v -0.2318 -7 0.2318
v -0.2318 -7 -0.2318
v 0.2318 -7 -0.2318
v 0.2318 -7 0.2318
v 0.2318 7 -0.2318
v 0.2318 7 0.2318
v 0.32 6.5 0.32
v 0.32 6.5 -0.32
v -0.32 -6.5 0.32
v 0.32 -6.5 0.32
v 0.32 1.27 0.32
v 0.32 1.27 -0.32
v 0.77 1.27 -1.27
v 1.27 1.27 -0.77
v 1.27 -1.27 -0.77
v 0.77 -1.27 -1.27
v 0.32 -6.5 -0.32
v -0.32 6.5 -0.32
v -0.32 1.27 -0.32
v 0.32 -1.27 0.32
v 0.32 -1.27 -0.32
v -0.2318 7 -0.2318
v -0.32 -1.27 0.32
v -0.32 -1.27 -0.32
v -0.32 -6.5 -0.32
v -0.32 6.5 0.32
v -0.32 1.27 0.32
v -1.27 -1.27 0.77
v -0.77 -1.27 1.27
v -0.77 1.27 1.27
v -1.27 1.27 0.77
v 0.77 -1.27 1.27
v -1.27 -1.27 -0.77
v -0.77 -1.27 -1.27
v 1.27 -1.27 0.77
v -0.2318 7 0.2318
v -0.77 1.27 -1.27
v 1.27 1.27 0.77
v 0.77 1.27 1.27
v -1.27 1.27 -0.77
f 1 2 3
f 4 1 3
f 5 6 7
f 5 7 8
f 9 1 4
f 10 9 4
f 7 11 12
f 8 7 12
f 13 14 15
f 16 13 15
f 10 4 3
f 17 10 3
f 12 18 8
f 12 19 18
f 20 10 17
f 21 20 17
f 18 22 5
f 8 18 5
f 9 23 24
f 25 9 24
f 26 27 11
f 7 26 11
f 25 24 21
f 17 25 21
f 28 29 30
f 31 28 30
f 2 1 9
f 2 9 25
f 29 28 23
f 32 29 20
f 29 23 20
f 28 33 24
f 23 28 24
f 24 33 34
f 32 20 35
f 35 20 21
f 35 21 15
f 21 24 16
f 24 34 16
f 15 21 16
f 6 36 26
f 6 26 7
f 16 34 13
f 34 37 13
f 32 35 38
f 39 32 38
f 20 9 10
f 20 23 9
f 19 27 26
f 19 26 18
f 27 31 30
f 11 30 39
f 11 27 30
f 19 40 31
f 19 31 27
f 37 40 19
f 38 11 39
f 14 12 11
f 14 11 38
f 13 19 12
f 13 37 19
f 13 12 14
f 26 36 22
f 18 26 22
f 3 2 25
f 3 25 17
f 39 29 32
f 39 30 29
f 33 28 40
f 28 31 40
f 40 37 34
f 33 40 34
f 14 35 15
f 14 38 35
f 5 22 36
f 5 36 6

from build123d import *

# Parameters (mm, degrees)
SKETCH1_W                = 2.54
SKETCH1_H                = 2.54
BOSS_EXTRUDE1_DEPTH      = 1.27
BOSS_EXTRUDE1_DEPTH_BACK = 1.27
SKETCH2_W                = 0.64
SKETCH2_H                = 0.64
BOSS_EXTRUDE2_DEPTH      = 7
BOSS_EXTRUDE2_DEPTH_BACK = 7
CHAMFER1_SIZE            = 0.5
CHAMFER1_SIZE2           = 0.08816349
CHAMFER1_PART_2_SIZE     = 0.5
CHAMFER1_PART_2_SIZE2    = 0.08816349
CHAMFER1_PART_3_SIZE     = 0.5
CHAMFER1_PART_3_SIZE2    = 0.08816349
CHAMFER1_PART_4_SIZE     = 0.5
CHAMFER1_PART_4_SIZE2    = 0.08816349
CHAMFER1_PART_5_SIZE     = 0.5
CHAMFER1_PART_5_SIZE2    = 0.08816349
CHAMFER1_PART_6_SIZE     = 0.5
CHAMFER1_PART_6_SIZE2    = 0.08816349
CHAMFER1_PART_7_SIZE     = 0.5
CHAMFER1_PART_7_SIZE2    = 0.08816349
CHAMFER1_PART_8_SIZE     = 0.5
CHAMFER1_PART_8_SIZE2    = 0.08816349
CHAMFER2_SIZE            = 0.5


with BuildPart() as part:
    # Sketch1 → Boss-Extrude1 (new body, two sides)
    with BuildSketch(Plane(origin=(0, 0, 0), x_dir=(1, 0, 0), z_dir=(0, 1, 0))) as boss_extrude1_sk:
        Rectangle(SKETCH1_W, SKETCH1_H)
    extrude(amount=BOSS_EXTRUDE1_DEPTH)
    extrude(boss_extrude1_sk.sketch, amount=-BOSS_EXTRUDE1_DEPTH_BACK)

    # Sketch2 → Boss-Extrude2 (add, two sides)
    with BuildSketch(Plane(origin=(0, 0, 0), x_dir=(1, 0, 0), z_dir=(0, 1, 0))) as boss_extrude2_sk:
        Rectangle(SKETCH2_W, SKETCH2_H)
    extrude(amount=BOSS_EXTRUDE2_DEPTH)
    extrude(boss_extrude2_sk.sketch, amount=-BOSS_EXTRUDE2_DEPTH_BACK)

    # Chamfer1
    chamfer1_edges = [part.edges().sort_by_distance(p)[0] for p in [
        (-0.32, -7, 0),
    ]]
    chamfer1_side = [part.faces().sort_by_distance(p)[0] for p in [
        (-0.32, -4.135, 0),
    ]]
    chamfer(chamfer1_edges, length=CHAMFER1_SIZE, length2=CHAMFER1_SIZE2, reference=chamfer1_side[0])

    # Chamfer1 part 2
    chamfer1_part_2_edges = [part.edges().sort_by_distance(p)[0] for p in [
        (0, -7, -0.32),
    ]]
    chamfer1_part_2_side = [part.faces().sort_by_distance(p)[0] for p in [
        (0, -4.135, -0.32),
    ]]
    chamfer(chamfer1_part_2_edges, length=CHAMFER1_PART_2_SIZE, length2=CHAMFER1_PART_2_SIZE2, reference=chamfer1_part_2_side[0])

    # Chamfer1 part 3
    chamfer1_part_3_edges = [part.edges().sort_by_distance(p)[0] for p in [
        (0.32, -7, 0),
    ]]
    chamfer1_part_3_side = [part.faces().sort_by_distance(p)[0] for p in [
        (0.32, -4.135, 0),
    ]]
    chamfer(chamfer1_part_3_edges, length=CHAMFER1_PART_3_SIZE, length2=CHAMFER1_PART_3_SIZE2, reference=chamfer1_part_3_side[0])

    # Chamfer1 part 4
    chamfer1_part_4_edges = [part.edges().sort_by_distance(p)[0] for p in [
        (0, -7, 0.32),
    ]]
    chamfer1_part_4_side = [part.faces().sort_by_distance(p)[0] for p in [
        (0, -4.135, 0.32),
    ]]
    chamfer(chamfer1_part_4_edges, length=CHAMFER1_PART_4_SIZE, length2=CHAMFER1_PART_4_SIZE2, reference=chamfer1_part_4_side[0])

    # Chamfer1 part 5
    chamfer1_part_5_edges = [part.edges().sort_by_distance(p)[0] for p in [
        (-0.32, 7, 0),
    ]]
    chamfer1_part_5_side = [part.faces().sort_by_distance(p)[0] for p in [
        (-0.32, 4.135, 0),
    ]]
    chamfer(chamfer1_part_5_edges, length=CHAMFER1_PART_5_SIZE, length2=CHAMFER1_PART_5_SIZE2, reference=chamfer1_part_5_side[0])

    # Chamfer1 part 6
    chamfer1_part_6_edges = [part.edges().sort_by_distance(p)[0] for p in [
        (0, 7, 0.32),
    ]]
    chamfer1_part_6_side = [part.faces().sort_by_distance(p)[0] for p in [
        (0, 4.135, 0.32),
    ]]
    chamfer(chamfer1_part_6_edges, length=CHAMFER1_PART_6_SIZE, length2=CHAMFER1_PART_6_SIZE2, reference=chamfer1_part_6_side[0])

    # Chamfer1 part 7
    chamfer1_part_7_edges = [part.edges().sort_by_distance(p)[0] for p in [
        (0.32, 7, 0),
    ]]
    chamfer1_part_7_side = [part.faces().sort_by_distance(p)[0] for p in [
        (0.32, 4.135, 0),
    ]]
    chamfer(chamfer1_part_7_edges, length=CHAMFER1_PART_7_SIZE, length2=CHAMFER1_PART_7_SIZE2, reference=chamfer1_part_7_side[0])

    # Chamfer1 part 8
    chamfer1_part_8_edges = [part.edges().sort_by_distance(p)[0] for p in [
        (0, 7, -0.32),
    ]]
    chamfer1_part_8_side = [part.faces().sort_by_distance(p)[0] for p in [
        (0, 4.135, -0.32),
    ]]
    chamfer(chamfer1_part_8_edges, length=CHAMFER1_PART_8_SIZE, length2=CHAMFER1_PART_8_SIZE2, reference=chamfer1_part_8_side[0])

    # Chamfer2
    chamfer2_edges = [part.edges().sort_by_distance(p)[0] for p in [
        (-1.27, 0, -1.27),
        (1.27, 0, -1.27),
        (1.27, 0, 1.27),
        (-1.27, 0, 1.27),
    ]]
    chamfer(chamfer2_edges, length=CHAMFER2_SIZE)


solid = part.part
